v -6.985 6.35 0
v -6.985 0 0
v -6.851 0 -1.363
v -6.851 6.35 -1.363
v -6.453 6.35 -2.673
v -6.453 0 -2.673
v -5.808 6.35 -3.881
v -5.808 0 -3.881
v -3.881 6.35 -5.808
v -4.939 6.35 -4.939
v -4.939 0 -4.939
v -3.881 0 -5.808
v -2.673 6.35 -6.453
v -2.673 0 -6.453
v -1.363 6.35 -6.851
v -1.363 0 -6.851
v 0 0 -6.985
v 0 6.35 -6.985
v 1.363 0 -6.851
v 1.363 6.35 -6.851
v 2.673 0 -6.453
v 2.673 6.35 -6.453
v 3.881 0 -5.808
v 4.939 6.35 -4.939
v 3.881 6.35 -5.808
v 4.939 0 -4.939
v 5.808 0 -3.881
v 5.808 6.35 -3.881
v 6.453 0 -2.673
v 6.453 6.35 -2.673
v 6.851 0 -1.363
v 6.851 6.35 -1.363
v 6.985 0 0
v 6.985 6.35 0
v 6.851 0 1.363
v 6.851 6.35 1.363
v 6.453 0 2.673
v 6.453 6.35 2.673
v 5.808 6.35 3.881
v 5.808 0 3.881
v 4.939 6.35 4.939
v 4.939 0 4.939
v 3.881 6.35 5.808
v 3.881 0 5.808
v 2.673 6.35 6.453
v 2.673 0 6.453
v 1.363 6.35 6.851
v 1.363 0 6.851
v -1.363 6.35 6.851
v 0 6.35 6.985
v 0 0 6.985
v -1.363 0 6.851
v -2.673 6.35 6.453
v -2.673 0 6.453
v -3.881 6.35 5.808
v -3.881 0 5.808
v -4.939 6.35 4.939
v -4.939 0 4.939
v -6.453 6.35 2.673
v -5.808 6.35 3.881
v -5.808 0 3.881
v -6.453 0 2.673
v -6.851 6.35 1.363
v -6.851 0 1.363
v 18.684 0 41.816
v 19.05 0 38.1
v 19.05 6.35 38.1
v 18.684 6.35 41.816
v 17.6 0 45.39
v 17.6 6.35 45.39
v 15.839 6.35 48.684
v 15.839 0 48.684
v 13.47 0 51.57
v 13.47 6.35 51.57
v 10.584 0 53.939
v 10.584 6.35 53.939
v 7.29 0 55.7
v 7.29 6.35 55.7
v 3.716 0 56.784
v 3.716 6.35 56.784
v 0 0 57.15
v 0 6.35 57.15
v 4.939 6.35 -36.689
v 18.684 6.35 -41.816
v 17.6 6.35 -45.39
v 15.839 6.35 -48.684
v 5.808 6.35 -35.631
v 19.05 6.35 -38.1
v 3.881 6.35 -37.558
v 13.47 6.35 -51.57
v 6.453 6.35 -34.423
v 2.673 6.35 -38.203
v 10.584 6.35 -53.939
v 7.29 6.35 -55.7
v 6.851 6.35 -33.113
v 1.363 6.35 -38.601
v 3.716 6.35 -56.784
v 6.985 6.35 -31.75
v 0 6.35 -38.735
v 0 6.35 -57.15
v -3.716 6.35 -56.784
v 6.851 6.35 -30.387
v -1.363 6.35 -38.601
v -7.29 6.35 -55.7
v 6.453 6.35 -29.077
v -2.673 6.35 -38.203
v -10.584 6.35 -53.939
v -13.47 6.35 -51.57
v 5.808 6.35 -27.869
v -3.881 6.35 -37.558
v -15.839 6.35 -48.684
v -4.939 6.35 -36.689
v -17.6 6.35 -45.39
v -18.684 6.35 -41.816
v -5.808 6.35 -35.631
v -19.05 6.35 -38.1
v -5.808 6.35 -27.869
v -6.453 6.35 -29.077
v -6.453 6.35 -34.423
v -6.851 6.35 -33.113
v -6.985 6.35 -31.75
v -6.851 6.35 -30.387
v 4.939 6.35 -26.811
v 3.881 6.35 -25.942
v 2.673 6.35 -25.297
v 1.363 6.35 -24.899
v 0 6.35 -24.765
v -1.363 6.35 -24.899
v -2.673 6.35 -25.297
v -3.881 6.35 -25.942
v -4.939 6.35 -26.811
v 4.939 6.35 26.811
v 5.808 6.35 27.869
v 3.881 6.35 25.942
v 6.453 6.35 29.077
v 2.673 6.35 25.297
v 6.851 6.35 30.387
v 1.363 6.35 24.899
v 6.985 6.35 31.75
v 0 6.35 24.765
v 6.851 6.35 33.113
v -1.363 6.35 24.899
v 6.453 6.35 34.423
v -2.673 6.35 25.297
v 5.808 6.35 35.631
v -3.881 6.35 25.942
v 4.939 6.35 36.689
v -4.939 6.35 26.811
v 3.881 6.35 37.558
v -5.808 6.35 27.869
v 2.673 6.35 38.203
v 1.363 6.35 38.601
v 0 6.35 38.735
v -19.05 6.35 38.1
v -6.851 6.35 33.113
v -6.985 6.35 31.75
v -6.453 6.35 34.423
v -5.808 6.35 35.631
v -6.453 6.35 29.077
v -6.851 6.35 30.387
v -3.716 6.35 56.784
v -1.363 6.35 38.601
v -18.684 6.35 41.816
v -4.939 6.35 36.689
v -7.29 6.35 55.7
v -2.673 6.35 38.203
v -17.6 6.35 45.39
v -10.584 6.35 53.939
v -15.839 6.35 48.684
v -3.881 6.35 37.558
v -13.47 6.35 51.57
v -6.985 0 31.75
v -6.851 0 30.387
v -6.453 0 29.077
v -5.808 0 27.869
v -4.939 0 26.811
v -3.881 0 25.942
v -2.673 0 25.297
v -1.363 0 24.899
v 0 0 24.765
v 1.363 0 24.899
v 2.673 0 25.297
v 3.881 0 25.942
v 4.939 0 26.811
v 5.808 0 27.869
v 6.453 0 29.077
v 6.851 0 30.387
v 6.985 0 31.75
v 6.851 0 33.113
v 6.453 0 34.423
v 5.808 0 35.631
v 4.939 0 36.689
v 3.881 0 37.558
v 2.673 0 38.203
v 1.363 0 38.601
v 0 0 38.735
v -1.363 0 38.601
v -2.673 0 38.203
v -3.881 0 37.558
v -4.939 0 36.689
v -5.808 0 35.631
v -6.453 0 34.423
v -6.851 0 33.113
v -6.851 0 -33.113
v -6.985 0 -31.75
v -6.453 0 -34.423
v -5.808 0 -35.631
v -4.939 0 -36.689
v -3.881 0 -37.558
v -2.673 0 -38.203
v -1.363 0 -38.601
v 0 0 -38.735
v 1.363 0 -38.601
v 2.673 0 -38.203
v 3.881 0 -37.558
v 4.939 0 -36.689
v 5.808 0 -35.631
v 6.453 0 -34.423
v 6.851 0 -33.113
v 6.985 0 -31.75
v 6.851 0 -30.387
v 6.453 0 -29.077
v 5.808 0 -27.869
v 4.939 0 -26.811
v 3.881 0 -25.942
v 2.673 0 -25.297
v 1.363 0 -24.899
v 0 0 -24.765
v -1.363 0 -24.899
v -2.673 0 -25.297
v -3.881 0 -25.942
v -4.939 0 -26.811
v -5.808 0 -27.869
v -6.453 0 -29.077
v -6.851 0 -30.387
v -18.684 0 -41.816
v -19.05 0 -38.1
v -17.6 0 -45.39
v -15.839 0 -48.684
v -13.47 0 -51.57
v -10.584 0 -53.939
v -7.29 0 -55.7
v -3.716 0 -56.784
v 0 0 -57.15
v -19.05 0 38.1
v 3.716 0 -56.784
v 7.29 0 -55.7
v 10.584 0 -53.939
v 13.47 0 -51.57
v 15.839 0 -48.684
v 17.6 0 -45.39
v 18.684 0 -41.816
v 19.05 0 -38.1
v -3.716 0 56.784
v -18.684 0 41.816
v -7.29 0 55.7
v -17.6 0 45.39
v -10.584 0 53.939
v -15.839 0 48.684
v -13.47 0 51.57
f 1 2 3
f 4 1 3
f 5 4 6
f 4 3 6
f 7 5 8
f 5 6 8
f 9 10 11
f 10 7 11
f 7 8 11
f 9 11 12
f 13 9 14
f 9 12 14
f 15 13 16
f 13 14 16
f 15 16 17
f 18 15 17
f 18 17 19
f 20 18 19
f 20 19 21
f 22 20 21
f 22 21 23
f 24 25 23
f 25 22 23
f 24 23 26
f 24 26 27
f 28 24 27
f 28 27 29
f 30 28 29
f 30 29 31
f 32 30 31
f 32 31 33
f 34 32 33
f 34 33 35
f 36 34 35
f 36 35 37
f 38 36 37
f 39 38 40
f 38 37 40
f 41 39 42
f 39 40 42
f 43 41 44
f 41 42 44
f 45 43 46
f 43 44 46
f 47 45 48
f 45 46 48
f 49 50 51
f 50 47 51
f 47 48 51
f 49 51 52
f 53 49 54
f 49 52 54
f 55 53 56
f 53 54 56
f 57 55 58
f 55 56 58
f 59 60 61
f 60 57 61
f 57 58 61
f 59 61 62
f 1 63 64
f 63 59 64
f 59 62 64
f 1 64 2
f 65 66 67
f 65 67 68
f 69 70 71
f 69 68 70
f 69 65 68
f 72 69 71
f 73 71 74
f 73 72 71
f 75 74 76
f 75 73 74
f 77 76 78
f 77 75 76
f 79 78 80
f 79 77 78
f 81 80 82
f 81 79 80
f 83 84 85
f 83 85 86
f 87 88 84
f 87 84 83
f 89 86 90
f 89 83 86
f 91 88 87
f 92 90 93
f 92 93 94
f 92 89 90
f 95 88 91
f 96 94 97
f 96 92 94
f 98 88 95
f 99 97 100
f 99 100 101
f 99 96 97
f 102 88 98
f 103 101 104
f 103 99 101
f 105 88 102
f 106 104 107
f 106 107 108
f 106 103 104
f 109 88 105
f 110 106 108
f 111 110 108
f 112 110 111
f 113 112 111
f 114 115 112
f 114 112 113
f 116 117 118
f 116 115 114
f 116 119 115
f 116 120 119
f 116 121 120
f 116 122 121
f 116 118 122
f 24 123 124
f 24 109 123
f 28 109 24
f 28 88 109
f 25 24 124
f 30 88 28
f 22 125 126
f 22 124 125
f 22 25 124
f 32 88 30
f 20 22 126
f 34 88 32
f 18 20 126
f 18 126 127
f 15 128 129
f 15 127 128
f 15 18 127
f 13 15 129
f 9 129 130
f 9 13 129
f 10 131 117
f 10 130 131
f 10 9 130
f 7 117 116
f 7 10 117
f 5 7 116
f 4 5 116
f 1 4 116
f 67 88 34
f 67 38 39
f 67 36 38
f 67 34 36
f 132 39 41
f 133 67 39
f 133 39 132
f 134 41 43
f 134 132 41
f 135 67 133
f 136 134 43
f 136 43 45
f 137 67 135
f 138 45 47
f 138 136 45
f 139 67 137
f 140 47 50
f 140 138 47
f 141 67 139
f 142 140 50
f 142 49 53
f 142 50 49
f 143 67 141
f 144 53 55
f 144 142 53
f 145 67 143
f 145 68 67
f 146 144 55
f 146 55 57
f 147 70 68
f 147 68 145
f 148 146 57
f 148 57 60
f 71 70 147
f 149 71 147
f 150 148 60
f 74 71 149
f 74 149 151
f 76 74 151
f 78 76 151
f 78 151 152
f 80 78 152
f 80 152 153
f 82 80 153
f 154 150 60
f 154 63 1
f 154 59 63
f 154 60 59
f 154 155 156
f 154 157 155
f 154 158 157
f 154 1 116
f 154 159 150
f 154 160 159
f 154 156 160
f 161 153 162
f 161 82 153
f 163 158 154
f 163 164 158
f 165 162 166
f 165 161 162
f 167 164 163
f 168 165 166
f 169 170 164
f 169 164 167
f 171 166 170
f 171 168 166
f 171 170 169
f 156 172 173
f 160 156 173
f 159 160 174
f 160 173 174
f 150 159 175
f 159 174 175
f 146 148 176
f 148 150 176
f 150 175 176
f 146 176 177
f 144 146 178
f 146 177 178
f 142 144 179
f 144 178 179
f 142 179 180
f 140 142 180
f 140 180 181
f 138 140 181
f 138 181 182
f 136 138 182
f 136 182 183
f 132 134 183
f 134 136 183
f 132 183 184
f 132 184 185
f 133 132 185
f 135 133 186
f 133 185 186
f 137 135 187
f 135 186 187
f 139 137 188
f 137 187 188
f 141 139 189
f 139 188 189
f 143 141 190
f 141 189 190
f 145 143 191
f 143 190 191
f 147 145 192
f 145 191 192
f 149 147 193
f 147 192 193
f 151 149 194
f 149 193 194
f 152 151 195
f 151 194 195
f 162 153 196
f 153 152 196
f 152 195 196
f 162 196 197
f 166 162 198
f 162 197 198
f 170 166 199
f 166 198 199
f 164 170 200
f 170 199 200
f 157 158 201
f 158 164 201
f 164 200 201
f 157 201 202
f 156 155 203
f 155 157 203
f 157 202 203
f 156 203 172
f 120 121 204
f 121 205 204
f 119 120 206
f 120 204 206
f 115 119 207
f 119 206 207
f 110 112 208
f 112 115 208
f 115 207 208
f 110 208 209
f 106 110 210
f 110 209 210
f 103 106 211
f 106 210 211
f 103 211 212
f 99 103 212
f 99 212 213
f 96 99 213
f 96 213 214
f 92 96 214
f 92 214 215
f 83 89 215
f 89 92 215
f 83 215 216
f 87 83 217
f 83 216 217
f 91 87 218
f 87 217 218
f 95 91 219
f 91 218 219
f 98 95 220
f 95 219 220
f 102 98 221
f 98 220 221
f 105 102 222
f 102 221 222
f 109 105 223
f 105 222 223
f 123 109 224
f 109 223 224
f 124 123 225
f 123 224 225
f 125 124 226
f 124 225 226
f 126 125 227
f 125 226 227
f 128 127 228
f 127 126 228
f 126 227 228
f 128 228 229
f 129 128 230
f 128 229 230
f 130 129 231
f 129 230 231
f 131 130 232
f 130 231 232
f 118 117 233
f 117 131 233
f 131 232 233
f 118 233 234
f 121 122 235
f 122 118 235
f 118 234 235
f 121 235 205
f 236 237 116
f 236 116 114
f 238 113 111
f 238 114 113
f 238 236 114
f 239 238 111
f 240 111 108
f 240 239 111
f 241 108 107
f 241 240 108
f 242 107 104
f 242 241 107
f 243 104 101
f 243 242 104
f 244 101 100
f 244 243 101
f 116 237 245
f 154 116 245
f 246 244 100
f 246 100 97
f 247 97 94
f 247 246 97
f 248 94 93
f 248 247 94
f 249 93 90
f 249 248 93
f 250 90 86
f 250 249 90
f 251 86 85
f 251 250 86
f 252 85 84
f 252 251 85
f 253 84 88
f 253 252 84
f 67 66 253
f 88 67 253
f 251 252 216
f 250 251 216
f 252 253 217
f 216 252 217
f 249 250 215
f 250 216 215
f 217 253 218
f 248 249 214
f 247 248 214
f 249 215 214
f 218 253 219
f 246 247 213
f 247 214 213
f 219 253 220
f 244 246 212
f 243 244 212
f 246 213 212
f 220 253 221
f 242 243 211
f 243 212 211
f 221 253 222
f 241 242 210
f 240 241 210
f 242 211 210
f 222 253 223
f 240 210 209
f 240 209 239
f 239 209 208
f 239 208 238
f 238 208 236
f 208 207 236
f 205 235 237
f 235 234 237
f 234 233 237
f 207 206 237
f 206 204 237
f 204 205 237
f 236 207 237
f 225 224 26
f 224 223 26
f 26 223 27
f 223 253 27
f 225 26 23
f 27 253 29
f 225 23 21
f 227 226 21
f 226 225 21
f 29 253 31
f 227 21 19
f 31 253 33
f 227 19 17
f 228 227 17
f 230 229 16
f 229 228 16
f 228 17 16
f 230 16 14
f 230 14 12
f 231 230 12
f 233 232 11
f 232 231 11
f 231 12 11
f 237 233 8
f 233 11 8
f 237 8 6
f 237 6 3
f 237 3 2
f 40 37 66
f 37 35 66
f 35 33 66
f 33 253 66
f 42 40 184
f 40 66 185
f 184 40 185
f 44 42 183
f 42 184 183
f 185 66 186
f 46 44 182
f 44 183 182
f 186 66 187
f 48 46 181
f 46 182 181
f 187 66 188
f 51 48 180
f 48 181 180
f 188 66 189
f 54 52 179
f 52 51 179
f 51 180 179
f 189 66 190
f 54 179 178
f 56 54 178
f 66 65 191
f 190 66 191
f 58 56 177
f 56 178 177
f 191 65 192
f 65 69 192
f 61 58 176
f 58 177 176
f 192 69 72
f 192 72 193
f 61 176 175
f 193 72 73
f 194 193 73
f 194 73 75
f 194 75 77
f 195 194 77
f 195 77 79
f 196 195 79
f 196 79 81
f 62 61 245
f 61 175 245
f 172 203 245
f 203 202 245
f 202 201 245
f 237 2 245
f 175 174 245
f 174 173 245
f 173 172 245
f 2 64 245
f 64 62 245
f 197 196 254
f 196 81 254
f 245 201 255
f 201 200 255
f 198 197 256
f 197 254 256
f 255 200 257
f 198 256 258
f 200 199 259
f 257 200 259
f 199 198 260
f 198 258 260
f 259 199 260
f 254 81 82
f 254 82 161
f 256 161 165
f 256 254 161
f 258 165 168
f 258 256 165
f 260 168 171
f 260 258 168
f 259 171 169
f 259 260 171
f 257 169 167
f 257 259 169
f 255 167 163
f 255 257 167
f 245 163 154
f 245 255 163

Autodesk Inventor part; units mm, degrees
ref_plane "YZ Plane" through (0, 0, 0) normal (1, 0, 0) x (0, 1, 0)
ref_plane "XZ Plane" through (0, 0, 0) normal (0, 1, 0) x (-1, 0, 0)
ref_plane "XY Plane" through (0, 0, 0) normal (0, 0, 1) x (1, 0, 0)
sketch "Sketch1" plane through (0, 0, 0) normal (0, 1, 0) x (-1, 0, 0)
  line L0 (0, -38.1) -> (0, 38.1) construction
  line L1 (19.05, -38.1) -> (19.05, 38.1)
  line L2 (-19.05, 38.1) -> (-19.05, -38.1)
  arc A0 (-19.05, -38.1) -> (19.05, -38.1) centre (0, -38.1) ccw
  arc A1 (19.05, 38.1) -> (-19.05, 38.1) centre (0, 38.1) ccw
  circle A2 centre (0, 0) radius 6.985
  circle A3 centre (0, -31.75) radius 6.985
  circle A4 centre (0, 31.75) radius 6.985
  line L3 (34.1256, 57.15) -> (-20.0171, 57.15)
  line L4 (24.6444, -57.15) -> (-26.3115, -57.15)
  dimension "d0" = 38.1
  dimension "d1" = 38.1
  dimension "d2" = 13.97
  dimension "d3" = 31.75
  dimension "d4" = 31.75
  dimension "d7" = 114.3
extrude "Extrusion1" add sketch "Sketch1" along normal blind 6.35
properties part number "Top Panel"
